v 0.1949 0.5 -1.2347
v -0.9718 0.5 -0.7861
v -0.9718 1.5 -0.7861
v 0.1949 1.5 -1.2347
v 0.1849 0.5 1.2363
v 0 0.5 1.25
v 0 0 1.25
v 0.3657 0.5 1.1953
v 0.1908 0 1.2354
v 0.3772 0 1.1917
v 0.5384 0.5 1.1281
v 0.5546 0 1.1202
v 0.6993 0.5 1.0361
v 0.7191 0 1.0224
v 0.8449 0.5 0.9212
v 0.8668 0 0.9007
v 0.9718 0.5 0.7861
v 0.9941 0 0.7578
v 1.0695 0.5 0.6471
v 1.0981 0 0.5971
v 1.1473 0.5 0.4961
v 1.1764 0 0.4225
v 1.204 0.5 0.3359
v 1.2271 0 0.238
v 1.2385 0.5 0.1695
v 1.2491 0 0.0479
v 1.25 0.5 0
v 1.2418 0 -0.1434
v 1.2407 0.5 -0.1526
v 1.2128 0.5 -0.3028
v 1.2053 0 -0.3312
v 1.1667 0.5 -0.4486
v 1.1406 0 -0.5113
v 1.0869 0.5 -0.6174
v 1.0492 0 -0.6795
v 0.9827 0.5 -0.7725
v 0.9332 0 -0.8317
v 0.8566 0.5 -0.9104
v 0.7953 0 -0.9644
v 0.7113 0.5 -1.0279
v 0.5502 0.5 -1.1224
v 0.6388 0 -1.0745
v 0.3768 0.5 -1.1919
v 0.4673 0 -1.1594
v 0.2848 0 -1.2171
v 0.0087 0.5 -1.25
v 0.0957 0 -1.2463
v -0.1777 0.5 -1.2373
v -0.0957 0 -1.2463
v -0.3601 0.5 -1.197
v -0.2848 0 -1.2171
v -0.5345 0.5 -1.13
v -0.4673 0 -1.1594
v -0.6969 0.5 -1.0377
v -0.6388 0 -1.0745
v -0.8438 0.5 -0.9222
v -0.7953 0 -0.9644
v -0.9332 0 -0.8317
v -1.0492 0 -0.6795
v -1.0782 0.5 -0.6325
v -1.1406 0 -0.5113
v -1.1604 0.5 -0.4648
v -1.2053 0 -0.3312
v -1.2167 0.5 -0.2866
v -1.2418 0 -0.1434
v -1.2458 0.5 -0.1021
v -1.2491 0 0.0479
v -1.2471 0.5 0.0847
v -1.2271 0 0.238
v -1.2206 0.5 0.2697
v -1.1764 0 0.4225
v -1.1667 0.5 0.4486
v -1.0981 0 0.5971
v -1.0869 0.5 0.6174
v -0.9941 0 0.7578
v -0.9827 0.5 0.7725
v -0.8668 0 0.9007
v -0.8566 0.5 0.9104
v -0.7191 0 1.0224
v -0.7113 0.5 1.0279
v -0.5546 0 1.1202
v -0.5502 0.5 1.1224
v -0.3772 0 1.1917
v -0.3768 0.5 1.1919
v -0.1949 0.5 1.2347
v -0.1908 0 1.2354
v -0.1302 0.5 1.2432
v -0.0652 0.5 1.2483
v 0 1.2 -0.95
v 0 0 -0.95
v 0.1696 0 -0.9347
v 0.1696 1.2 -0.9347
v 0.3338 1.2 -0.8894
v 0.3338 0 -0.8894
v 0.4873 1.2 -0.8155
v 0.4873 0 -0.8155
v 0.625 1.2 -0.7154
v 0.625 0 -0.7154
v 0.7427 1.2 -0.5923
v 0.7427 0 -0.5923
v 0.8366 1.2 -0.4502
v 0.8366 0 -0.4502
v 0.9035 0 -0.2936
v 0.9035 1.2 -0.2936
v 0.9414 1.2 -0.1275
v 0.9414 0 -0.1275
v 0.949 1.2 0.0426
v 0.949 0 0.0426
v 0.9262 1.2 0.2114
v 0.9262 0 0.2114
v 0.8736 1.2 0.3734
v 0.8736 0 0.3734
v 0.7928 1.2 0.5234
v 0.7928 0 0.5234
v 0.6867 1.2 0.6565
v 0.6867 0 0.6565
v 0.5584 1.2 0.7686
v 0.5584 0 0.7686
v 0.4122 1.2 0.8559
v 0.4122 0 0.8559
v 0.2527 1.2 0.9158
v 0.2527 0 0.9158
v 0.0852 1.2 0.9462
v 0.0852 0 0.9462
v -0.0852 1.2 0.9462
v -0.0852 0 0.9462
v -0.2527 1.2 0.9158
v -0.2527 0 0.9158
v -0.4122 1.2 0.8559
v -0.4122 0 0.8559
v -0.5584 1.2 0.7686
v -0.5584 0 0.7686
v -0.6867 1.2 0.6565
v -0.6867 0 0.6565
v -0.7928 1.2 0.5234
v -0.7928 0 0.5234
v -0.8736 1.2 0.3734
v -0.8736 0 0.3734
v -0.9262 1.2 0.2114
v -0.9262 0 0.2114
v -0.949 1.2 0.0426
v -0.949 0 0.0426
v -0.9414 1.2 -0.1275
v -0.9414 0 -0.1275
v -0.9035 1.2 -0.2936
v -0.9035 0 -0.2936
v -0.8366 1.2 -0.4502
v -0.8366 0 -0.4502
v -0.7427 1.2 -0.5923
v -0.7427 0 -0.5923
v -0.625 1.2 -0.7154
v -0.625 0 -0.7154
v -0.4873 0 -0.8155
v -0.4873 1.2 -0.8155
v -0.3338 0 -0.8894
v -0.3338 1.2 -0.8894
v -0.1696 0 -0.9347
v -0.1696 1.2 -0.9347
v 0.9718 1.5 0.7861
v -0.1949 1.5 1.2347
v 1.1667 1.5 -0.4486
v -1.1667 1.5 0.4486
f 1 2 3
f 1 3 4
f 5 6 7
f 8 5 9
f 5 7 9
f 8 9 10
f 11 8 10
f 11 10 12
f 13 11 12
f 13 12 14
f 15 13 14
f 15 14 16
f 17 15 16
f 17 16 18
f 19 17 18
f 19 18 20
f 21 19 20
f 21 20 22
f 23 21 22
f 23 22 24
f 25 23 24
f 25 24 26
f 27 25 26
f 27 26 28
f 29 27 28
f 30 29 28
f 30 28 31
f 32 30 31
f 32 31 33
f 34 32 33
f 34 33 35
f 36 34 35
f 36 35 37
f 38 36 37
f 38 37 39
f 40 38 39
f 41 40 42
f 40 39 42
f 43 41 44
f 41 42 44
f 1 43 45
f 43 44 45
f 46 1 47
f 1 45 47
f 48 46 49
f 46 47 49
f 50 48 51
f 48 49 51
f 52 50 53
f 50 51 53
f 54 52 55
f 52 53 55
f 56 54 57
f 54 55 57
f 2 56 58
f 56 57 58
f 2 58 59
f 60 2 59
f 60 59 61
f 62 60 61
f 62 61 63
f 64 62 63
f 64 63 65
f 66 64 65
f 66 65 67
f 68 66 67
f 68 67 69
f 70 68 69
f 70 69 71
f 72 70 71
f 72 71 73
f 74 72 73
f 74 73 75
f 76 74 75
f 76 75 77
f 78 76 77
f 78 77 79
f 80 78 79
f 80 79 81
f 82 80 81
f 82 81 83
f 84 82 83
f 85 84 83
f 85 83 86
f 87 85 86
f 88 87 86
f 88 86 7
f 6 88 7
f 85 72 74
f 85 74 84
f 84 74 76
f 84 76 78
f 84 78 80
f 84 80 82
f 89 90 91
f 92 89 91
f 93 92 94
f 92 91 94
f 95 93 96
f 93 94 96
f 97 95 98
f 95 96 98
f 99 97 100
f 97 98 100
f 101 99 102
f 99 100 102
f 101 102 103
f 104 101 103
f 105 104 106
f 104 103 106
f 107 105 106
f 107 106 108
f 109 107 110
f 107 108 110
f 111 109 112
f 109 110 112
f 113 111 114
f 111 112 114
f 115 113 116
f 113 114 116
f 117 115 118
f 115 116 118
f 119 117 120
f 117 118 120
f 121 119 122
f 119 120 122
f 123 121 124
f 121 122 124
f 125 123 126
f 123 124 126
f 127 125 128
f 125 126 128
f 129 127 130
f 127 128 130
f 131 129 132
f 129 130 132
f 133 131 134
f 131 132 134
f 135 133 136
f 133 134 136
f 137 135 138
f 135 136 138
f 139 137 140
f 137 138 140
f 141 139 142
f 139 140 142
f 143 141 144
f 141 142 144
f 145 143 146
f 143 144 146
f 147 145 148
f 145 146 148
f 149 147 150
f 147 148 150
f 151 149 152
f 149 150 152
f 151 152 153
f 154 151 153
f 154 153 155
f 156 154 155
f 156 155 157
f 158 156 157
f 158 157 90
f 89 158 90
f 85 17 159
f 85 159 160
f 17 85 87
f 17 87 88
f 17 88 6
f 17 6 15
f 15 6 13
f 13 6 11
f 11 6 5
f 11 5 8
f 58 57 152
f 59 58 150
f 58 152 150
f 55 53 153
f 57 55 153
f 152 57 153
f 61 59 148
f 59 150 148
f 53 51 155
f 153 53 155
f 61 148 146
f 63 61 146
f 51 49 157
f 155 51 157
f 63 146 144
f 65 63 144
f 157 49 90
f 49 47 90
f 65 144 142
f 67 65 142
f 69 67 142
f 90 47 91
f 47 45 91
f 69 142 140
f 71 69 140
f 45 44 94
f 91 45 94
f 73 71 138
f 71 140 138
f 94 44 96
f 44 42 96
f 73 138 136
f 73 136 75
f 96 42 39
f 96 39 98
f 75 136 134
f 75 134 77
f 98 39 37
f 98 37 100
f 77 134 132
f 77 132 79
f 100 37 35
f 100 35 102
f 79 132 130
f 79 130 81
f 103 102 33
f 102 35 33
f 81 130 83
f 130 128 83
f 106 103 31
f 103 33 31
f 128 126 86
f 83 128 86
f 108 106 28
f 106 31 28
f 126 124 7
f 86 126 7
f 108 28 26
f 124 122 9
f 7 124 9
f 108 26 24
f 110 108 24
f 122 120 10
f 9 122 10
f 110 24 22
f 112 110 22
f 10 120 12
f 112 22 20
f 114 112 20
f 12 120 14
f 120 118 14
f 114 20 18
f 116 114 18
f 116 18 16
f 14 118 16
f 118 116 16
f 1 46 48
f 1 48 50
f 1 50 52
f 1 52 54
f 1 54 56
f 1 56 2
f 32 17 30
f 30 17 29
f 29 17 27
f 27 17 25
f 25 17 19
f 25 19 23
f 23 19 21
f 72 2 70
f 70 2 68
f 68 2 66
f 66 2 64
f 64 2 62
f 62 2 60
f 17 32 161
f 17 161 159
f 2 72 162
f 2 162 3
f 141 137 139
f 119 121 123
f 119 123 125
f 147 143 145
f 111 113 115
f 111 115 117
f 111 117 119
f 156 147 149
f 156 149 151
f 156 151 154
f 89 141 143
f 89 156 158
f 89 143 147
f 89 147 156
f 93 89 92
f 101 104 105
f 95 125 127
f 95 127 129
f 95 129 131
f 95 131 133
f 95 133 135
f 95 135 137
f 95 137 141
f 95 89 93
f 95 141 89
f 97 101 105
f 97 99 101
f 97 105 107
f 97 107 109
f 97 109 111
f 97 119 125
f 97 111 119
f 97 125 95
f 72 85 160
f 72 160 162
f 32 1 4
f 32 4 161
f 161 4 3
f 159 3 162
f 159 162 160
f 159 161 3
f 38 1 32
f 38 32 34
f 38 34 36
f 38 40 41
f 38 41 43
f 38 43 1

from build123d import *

# Parameters (mm, degrees)
SKETCH_1_R          = 1.25
EXTRUDE_1_DEPTH     = 1.5
SKETCH_2_R          = 0.95
CUT_EXTRUDE_1_DEPTH = 1.2
CUT_EXTRUDE_START   = -1
CUT_EXTRUDE_2_DEPTH = 1


with BuildPart() as part:
    # Эскиз1 → Бобышка-Вытянуть1 (new body)
    with BuildSketch(Plane(origin=(0, 0, 0), x_dir=(1, 0, 0), z_dir=(0, 1, 0))):
        with Locations(Location((0, 0, 0), (0, 0, 270))):
            Circle(SKETCH_1_R)
    extrude(amount=EXTRUDE_1_DEPTH)

    # Эскиз2 → Вырез-Вытянуть1 (cut)
    with BuildSketch(Plane.XZ):
        with Locations(Location((0, 0, 0), (0, 0, 270))):
            Circle(SKETCH_2_R)
    extrude(amount=-CUT_EXTRUDE_1_DEPTH, mode=Mode.SUBTRACT)

    # Эскиз3 → Вырез-Вытянуть2 (cut)
    with BuildSketch(Plane(origin=(0, 1.5, 0), x_dir=(1, 0, 0), z_dir=(0, 1, 0)).offset(CUT_EXTRUDE_START)):
        with BuildLine():
            ThreePointArc((-0.194904913, -1.234711333), (0.44856306, -1.166743837), (0.971838924, -0.786148272))
            Line((0.971838924, -0.786148272), (-0.194904913, -1.234711333))
        make_face()
        with BuildLine():
            ThreePointArc((-1.166743837, -0.44856306), (-0.786148272, -0.971838924), (-0.194904913, -1.234711333))
            Line((-0.194904913, -1.234711333), (-1.166743837, -0.44856306))
        make_face()
        with BuildLine():
            ThreePointArc((-0.971838924, 0.786148272), (-1.234711333, 0.194904913), (-1.166743837, -0.44856306))
            Line((-1.166743837, -0.44856306), (-0.971838924, 0.786148272))
        make_face()
        with BuildLine():
            Line((-0.971838924, 0.786148272), (0.194904913, 1.234711333))
            ThreePointArc((0.194904913, 1.234711333), (-0.44856306, 1.166743837), (-0.971838924, 0.786148272))
        make_face()
        with BuildLine():
            Line((0.194904913, 1.234711333), (1.166743837, 0.44856306))
            ThreePointArc((1.166743837, 0.44856306), (0.786148272, 0.971838924), (0.194904913, 1.234711333))
        make_face()
        with BuildLine():
            Line((1.166743837, 0.44856306), (0.971838924, -0.786148272))
            ThreePointArc((0.971838924, -0.786148272), (1.17840966, -0.416954041), (1.25, 0))
            ThreePointArc((1.25, 0), (1.229009723, 0.228112038), (1.166743837, 0.44856306))
        make_face()
    extrude(amount=CUT_EXTRUDE_2_DEPTH, mode=Mode.SUBTRACT)


solid = part.part
